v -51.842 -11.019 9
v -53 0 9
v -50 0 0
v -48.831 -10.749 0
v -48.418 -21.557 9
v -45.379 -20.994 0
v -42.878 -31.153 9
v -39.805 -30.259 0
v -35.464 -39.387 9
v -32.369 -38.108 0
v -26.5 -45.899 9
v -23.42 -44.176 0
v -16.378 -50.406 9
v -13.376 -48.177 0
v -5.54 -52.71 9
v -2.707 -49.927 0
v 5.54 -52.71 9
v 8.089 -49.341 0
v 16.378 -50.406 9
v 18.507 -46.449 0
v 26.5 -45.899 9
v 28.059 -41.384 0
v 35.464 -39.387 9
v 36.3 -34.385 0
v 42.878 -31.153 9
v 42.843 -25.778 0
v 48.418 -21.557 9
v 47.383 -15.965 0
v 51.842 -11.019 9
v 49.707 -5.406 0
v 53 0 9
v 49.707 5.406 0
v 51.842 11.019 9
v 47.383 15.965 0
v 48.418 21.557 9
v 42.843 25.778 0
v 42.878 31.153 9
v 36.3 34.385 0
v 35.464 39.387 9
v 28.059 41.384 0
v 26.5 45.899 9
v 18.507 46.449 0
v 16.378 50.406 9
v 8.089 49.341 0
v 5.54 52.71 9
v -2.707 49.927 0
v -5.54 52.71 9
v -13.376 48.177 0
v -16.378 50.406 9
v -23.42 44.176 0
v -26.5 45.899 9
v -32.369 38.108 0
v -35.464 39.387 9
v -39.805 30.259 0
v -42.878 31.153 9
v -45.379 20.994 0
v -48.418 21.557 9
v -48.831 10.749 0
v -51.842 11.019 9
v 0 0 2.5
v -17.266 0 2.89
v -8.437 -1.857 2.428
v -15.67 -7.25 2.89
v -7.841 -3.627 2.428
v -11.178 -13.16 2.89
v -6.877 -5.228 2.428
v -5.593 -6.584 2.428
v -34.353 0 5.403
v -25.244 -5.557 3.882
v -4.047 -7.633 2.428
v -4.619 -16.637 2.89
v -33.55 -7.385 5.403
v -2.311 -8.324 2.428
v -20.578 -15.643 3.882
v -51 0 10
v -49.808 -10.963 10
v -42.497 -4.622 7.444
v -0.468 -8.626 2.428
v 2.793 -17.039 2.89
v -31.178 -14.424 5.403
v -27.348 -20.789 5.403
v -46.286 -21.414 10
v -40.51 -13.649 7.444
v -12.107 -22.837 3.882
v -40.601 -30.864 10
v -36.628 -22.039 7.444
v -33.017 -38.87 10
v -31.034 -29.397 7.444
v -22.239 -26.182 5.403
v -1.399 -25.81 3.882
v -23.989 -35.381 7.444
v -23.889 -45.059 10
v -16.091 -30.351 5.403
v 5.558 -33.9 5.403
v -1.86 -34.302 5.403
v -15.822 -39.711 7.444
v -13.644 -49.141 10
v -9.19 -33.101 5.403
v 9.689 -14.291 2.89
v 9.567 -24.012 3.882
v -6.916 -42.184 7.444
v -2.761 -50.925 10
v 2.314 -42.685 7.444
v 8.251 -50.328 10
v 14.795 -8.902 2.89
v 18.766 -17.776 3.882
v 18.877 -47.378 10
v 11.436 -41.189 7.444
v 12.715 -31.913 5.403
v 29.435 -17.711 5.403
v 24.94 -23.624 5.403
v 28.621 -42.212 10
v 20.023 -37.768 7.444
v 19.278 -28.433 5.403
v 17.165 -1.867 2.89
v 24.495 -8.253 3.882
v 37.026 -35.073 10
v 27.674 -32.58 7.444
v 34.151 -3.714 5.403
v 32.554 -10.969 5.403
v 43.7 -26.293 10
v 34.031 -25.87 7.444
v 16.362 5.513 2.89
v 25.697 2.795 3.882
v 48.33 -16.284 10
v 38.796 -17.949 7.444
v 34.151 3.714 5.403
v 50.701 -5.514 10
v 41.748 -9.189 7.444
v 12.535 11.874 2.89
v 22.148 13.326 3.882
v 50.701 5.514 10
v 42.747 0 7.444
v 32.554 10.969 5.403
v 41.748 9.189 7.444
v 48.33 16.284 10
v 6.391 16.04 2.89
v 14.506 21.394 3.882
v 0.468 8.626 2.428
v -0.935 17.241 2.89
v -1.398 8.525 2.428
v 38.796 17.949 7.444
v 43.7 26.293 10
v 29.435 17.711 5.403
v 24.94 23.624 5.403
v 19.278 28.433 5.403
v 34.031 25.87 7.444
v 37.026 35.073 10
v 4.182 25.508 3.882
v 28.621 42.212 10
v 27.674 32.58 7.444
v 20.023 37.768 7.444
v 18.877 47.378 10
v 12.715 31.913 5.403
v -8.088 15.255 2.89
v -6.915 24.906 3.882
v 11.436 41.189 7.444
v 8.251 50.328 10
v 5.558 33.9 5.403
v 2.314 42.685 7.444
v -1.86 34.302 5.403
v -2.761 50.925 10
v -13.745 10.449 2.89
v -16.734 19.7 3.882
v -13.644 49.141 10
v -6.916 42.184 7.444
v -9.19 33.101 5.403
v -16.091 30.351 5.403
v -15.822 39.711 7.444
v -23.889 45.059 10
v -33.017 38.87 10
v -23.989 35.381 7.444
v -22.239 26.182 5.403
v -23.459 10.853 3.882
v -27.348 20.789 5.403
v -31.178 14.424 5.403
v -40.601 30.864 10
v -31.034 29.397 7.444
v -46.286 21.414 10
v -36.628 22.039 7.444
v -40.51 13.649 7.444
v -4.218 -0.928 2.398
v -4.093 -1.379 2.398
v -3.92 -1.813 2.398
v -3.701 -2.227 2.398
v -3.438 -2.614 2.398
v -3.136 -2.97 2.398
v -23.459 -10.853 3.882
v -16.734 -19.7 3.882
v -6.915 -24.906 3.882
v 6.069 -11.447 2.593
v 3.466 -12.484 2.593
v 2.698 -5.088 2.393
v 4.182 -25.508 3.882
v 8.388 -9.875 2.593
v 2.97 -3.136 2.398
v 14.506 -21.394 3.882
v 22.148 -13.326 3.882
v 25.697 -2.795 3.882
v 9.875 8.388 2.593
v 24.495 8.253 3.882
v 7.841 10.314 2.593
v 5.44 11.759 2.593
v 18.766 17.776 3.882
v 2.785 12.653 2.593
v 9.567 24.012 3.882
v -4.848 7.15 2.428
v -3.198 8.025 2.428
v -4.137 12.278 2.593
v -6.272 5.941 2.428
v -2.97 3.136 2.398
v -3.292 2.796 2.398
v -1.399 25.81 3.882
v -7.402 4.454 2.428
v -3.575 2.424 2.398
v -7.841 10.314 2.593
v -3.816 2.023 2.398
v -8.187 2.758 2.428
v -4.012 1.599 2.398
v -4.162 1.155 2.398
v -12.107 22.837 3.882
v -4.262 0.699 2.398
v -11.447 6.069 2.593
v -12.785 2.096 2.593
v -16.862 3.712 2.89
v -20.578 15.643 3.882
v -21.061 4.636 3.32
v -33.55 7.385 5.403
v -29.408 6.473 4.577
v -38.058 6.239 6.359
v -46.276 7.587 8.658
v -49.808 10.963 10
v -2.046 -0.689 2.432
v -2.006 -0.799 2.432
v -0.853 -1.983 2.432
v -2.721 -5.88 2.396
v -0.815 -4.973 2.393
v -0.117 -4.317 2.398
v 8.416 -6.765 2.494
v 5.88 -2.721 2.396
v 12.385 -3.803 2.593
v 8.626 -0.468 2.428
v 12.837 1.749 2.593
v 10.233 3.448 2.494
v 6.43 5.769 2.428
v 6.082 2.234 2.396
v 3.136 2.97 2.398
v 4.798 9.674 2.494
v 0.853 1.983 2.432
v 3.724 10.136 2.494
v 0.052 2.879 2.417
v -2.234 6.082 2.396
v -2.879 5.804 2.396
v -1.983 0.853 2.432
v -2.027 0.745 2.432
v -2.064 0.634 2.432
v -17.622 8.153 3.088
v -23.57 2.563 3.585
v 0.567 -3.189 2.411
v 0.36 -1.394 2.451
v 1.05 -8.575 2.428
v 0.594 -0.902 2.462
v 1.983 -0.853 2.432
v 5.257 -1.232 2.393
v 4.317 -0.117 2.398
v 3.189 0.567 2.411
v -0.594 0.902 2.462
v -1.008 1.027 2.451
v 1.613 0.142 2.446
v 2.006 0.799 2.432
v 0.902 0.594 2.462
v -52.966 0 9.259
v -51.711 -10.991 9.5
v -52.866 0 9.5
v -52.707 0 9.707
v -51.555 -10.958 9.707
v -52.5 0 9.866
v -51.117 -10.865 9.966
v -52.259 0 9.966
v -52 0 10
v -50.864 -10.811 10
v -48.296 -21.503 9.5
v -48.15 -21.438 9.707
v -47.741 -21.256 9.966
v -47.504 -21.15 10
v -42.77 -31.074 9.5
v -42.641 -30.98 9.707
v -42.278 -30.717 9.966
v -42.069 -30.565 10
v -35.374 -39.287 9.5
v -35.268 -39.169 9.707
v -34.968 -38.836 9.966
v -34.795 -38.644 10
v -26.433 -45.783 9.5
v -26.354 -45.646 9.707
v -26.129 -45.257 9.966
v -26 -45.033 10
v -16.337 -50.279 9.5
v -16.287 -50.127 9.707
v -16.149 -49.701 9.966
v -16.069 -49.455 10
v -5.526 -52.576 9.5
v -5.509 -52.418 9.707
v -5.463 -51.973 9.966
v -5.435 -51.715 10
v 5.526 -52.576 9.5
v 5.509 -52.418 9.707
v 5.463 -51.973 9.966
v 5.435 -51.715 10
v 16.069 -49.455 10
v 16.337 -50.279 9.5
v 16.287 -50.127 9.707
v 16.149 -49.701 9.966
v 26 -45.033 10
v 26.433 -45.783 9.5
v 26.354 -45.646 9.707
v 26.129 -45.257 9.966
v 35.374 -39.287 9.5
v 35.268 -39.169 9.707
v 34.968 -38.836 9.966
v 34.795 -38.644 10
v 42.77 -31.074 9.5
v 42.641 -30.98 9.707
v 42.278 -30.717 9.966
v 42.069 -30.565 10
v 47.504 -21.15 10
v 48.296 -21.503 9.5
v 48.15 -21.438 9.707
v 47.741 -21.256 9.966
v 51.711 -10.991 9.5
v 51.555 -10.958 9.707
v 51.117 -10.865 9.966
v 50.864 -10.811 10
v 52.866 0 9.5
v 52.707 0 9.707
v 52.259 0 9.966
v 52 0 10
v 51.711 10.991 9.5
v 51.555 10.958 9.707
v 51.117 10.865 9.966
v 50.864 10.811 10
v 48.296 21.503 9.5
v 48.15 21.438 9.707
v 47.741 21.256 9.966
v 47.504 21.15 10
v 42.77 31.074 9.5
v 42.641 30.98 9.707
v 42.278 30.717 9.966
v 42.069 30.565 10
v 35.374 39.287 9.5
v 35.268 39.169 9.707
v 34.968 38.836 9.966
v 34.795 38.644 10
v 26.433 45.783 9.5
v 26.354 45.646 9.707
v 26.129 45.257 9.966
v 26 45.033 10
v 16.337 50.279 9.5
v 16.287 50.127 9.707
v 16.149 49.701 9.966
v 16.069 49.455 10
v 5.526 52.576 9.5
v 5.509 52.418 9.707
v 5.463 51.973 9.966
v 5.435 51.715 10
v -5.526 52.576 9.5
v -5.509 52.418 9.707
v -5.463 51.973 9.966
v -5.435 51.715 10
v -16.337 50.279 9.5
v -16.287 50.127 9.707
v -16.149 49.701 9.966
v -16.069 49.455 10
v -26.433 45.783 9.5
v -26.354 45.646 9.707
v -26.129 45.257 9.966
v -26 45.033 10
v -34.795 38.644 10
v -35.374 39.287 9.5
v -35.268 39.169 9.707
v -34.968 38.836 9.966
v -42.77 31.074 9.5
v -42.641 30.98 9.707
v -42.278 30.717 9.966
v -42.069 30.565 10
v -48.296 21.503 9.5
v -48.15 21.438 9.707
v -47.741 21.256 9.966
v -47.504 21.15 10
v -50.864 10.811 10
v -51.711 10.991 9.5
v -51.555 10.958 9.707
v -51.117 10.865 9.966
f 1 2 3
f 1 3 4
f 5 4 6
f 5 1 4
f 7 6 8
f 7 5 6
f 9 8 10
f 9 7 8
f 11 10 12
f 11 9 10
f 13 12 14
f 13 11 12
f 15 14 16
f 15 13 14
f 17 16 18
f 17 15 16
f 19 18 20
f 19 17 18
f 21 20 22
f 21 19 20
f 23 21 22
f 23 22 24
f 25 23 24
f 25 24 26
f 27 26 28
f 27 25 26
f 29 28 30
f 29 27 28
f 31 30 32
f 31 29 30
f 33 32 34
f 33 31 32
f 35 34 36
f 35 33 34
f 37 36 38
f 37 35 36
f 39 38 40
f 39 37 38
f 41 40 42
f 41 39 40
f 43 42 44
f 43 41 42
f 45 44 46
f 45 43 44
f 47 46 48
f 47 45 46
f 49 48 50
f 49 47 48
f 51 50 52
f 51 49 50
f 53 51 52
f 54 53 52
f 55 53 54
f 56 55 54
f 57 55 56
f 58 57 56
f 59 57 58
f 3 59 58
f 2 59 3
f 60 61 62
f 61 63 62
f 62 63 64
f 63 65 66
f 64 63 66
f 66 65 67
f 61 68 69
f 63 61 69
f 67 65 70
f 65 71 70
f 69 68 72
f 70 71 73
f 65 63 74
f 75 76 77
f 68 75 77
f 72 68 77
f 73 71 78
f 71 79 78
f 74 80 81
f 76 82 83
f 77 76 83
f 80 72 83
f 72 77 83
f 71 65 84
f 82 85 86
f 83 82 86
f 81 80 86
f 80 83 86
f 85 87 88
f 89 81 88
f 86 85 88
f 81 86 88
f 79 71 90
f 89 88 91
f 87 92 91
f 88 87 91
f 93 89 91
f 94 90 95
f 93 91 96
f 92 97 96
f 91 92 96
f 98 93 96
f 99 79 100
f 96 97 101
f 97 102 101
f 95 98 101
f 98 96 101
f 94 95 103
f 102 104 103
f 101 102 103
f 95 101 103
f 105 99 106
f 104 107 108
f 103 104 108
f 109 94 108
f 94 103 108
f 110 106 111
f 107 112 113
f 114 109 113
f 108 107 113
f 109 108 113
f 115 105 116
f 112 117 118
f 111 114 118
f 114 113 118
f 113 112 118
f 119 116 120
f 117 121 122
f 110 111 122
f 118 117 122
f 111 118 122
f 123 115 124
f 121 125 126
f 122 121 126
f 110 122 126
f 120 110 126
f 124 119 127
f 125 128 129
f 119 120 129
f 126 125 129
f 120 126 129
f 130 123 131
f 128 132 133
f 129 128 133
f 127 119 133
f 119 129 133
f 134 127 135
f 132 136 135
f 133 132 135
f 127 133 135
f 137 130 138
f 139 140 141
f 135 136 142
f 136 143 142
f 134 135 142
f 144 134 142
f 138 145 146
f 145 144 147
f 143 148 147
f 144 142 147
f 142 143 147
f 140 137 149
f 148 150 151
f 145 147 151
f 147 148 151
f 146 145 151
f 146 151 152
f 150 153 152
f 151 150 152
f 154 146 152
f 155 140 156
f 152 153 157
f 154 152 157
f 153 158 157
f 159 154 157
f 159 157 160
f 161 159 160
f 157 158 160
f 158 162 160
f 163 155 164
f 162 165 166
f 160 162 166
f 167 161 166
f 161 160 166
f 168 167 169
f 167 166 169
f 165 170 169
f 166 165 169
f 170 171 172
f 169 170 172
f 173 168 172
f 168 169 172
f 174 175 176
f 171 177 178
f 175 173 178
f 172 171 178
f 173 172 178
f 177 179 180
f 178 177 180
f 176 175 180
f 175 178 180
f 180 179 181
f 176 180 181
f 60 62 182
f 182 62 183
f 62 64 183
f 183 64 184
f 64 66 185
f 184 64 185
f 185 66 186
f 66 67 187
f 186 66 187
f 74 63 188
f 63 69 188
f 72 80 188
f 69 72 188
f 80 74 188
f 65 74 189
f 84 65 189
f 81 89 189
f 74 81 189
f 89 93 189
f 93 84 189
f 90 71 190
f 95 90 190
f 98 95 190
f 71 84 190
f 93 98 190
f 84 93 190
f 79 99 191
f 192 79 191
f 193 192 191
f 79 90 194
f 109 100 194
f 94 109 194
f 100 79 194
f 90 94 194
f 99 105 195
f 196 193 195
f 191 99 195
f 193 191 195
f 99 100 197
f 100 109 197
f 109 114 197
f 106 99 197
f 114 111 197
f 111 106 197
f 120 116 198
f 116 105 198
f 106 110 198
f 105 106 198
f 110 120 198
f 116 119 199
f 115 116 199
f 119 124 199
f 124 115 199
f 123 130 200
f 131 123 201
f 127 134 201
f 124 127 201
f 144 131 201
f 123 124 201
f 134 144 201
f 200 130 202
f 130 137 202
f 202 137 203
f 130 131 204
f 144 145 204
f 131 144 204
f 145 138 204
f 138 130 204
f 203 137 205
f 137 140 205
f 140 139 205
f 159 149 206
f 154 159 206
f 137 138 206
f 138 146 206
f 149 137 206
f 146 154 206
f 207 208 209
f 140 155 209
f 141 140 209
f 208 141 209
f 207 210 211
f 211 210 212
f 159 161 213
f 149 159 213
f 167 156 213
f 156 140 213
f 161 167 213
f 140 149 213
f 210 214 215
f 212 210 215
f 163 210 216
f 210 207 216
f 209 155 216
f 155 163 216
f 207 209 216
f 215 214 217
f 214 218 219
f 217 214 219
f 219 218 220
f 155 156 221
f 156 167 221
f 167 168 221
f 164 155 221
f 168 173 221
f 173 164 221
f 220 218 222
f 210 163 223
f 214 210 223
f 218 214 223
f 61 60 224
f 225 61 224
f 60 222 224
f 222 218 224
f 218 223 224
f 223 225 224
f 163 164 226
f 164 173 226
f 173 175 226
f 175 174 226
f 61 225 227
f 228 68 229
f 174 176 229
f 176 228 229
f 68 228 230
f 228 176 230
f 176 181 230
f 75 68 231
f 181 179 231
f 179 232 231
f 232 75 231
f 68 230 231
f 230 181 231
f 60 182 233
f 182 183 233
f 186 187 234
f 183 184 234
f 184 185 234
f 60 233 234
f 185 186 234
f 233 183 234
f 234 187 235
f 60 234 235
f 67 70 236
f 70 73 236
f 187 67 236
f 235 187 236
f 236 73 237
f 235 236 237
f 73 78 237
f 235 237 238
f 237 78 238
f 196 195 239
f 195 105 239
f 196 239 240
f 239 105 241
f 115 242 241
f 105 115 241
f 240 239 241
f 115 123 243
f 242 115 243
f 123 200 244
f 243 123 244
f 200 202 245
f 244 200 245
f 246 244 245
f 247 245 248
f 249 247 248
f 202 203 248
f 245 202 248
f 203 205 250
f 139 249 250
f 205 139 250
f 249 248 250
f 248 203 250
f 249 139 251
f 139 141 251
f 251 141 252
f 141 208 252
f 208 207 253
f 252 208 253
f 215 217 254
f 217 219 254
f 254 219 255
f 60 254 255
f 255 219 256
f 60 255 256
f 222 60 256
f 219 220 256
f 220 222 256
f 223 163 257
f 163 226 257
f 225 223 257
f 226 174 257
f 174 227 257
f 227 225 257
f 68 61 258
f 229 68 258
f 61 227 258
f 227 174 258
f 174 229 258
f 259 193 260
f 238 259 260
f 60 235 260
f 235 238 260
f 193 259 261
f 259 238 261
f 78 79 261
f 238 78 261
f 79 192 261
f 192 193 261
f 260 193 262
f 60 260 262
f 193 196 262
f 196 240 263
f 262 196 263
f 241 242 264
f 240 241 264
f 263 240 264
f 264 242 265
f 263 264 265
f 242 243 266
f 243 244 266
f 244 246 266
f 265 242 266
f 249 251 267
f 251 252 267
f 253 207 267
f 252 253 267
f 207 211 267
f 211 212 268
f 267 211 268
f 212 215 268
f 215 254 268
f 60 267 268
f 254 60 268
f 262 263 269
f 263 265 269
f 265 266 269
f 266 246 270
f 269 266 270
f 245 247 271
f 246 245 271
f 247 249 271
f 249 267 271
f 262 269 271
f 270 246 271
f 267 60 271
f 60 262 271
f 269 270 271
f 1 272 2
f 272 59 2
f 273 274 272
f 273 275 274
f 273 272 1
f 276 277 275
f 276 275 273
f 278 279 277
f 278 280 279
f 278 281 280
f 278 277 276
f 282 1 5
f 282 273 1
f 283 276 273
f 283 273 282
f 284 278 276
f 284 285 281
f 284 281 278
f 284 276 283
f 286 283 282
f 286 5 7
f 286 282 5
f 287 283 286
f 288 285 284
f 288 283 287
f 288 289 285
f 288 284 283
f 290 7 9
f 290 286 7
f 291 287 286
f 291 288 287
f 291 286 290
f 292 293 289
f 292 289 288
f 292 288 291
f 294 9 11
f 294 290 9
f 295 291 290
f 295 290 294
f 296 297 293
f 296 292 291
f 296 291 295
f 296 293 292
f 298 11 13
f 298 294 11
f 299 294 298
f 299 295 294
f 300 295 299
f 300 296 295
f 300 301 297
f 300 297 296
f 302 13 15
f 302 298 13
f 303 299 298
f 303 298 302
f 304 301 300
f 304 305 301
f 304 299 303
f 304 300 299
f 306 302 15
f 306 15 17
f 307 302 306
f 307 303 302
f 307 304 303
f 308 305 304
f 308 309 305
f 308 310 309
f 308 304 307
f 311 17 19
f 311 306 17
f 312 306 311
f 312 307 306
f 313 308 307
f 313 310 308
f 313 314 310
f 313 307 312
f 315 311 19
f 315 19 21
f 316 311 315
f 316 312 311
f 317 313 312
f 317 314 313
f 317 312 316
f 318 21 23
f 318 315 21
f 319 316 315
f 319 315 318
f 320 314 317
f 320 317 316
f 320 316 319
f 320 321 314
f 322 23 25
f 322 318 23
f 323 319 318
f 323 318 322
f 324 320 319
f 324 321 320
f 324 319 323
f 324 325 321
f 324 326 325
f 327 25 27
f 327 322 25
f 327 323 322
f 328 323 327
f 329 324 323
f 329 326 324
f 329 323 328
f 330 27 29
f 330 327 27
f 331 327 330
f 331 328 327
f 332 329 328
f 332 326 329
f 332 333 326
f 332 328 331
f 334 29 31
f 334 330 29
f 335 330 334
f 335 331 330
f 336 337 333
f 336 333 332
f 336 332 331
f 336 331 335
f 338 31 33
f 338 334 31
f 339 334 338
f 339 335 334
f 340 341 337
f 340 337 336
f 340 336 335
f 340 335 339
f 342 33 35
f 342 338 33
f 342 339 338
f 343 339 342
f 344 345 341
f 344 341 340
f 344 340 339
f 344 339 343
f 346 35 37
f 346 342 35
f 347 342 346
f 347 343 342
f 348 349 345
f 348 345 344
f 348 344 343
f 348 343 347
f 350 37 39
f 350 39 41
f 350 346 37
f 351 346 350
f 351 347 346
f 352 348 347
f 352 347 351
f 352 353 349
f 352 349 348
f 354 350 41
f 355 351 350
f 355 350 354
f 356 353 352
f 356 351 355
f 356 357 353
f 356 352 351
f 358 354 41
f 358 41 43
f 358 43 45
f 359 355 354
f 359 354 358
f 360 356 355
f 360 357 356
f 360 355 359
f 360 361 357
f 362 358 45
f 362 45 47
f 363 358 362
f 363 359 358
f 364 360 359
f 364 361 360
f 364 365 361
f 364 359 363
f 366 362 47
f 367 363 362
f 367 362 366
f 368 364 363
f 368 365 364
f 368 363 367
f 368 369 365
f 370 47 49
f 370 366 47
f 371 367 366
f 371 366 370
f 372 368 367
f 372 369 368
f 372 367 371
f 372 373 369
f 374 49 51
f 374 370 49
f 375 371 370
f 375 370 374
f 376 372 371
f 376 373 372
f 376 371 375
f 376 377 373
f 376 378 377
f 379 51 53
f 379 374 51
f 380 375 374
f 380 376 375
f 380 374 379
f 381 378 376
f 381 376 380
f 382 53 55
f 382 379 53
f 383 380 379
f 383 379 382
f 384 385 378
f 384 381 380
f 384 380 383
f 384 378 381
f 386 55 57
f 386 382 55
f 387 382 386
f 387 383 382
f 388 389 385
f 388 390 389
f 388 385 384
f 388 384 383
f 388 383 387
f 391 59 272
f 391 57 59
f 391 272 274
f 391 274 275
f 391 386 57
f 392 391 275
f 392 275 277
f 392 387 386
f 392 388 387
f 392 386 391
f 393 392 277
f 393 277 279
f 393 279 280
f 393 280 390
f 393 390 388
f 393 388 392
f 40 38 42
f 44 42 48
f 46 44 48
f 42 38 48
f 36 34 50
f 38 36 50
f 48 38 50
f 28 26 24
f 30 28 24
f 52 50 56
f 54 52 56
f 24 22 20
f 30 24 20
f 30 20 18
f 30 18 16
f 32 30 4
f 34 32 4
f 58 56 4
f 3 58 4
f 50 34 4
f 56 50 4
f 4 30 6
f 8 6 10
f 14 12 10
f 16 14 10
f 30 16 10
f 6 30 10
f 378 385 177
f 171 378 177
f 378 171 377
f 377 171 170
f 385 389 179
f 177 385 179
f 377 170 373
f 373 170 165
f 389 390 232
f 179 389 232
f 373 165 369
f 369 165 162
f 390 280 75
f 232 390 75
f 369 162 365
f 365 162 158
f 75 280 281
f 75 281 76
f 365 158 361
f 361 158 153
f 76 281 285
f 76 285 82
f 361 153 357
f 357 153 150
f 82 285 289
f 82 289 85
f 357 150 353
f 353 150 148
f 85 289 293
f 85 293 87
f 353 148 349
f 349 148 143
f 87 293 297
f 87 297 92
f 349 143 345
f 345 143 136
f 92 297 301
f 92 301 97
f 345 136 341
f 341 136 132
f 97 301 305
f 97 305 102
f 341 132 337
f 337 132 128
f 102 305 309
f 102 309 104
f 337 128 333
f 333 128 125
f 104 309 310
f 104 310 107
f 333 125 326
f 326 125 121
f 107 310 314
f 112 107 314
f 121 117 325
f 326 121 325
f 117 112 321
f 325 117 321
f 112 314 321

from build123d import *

# Parameters (mm, degrees)
F2_SIZE2 = 9
F2_SIZE  = 3
F3_R     = 0.99999


# Not quite as in the source:
# - a fillet or chamfer is up to 0.001 mm smaller than in the source, because OpenCascade refuses the exact size


with BuildPart() as f1:
    # F0 (on Front) → F1 (revolve)
    with BuildSketch(Plane.XZ):
        with BuildLine():
            Line((-53, 0), (0, 0))
            Line((0, 0), (0, 2.5))
            ThreePointArc((0, 2.5), (-25.8481665636, 3.8824673673), (-51, 10))
            Line((-51, 10), (-53, 10))
            Line((-53, 10), (-53, 0))
        make_face()
    revolve(axis=Axis((0, 0, 5), (0, 0, 1)))

    # F2
    f2_edges = [f1.edges().sort_by_distance(p)[0] for p in [
        (53, 0, 0),
    ]]
    f2_side = f1.faces().sort_by_distance((0, 0, 0))[0]
    chamfer(f2_edges, length=F2_SIZE, length2=F2_SIZE2, reference=f2_side)

    # F3 (radius 1 in the source; OpenCascade refuses exactly that, so slightly less here)
    f3_edges = [f1.edges().sort_by_distance(p)[0] for p in [
        (53, 0, 10),
    ]]
    fillet(f3_edges, radius=F3_R)


solid = f1.part
